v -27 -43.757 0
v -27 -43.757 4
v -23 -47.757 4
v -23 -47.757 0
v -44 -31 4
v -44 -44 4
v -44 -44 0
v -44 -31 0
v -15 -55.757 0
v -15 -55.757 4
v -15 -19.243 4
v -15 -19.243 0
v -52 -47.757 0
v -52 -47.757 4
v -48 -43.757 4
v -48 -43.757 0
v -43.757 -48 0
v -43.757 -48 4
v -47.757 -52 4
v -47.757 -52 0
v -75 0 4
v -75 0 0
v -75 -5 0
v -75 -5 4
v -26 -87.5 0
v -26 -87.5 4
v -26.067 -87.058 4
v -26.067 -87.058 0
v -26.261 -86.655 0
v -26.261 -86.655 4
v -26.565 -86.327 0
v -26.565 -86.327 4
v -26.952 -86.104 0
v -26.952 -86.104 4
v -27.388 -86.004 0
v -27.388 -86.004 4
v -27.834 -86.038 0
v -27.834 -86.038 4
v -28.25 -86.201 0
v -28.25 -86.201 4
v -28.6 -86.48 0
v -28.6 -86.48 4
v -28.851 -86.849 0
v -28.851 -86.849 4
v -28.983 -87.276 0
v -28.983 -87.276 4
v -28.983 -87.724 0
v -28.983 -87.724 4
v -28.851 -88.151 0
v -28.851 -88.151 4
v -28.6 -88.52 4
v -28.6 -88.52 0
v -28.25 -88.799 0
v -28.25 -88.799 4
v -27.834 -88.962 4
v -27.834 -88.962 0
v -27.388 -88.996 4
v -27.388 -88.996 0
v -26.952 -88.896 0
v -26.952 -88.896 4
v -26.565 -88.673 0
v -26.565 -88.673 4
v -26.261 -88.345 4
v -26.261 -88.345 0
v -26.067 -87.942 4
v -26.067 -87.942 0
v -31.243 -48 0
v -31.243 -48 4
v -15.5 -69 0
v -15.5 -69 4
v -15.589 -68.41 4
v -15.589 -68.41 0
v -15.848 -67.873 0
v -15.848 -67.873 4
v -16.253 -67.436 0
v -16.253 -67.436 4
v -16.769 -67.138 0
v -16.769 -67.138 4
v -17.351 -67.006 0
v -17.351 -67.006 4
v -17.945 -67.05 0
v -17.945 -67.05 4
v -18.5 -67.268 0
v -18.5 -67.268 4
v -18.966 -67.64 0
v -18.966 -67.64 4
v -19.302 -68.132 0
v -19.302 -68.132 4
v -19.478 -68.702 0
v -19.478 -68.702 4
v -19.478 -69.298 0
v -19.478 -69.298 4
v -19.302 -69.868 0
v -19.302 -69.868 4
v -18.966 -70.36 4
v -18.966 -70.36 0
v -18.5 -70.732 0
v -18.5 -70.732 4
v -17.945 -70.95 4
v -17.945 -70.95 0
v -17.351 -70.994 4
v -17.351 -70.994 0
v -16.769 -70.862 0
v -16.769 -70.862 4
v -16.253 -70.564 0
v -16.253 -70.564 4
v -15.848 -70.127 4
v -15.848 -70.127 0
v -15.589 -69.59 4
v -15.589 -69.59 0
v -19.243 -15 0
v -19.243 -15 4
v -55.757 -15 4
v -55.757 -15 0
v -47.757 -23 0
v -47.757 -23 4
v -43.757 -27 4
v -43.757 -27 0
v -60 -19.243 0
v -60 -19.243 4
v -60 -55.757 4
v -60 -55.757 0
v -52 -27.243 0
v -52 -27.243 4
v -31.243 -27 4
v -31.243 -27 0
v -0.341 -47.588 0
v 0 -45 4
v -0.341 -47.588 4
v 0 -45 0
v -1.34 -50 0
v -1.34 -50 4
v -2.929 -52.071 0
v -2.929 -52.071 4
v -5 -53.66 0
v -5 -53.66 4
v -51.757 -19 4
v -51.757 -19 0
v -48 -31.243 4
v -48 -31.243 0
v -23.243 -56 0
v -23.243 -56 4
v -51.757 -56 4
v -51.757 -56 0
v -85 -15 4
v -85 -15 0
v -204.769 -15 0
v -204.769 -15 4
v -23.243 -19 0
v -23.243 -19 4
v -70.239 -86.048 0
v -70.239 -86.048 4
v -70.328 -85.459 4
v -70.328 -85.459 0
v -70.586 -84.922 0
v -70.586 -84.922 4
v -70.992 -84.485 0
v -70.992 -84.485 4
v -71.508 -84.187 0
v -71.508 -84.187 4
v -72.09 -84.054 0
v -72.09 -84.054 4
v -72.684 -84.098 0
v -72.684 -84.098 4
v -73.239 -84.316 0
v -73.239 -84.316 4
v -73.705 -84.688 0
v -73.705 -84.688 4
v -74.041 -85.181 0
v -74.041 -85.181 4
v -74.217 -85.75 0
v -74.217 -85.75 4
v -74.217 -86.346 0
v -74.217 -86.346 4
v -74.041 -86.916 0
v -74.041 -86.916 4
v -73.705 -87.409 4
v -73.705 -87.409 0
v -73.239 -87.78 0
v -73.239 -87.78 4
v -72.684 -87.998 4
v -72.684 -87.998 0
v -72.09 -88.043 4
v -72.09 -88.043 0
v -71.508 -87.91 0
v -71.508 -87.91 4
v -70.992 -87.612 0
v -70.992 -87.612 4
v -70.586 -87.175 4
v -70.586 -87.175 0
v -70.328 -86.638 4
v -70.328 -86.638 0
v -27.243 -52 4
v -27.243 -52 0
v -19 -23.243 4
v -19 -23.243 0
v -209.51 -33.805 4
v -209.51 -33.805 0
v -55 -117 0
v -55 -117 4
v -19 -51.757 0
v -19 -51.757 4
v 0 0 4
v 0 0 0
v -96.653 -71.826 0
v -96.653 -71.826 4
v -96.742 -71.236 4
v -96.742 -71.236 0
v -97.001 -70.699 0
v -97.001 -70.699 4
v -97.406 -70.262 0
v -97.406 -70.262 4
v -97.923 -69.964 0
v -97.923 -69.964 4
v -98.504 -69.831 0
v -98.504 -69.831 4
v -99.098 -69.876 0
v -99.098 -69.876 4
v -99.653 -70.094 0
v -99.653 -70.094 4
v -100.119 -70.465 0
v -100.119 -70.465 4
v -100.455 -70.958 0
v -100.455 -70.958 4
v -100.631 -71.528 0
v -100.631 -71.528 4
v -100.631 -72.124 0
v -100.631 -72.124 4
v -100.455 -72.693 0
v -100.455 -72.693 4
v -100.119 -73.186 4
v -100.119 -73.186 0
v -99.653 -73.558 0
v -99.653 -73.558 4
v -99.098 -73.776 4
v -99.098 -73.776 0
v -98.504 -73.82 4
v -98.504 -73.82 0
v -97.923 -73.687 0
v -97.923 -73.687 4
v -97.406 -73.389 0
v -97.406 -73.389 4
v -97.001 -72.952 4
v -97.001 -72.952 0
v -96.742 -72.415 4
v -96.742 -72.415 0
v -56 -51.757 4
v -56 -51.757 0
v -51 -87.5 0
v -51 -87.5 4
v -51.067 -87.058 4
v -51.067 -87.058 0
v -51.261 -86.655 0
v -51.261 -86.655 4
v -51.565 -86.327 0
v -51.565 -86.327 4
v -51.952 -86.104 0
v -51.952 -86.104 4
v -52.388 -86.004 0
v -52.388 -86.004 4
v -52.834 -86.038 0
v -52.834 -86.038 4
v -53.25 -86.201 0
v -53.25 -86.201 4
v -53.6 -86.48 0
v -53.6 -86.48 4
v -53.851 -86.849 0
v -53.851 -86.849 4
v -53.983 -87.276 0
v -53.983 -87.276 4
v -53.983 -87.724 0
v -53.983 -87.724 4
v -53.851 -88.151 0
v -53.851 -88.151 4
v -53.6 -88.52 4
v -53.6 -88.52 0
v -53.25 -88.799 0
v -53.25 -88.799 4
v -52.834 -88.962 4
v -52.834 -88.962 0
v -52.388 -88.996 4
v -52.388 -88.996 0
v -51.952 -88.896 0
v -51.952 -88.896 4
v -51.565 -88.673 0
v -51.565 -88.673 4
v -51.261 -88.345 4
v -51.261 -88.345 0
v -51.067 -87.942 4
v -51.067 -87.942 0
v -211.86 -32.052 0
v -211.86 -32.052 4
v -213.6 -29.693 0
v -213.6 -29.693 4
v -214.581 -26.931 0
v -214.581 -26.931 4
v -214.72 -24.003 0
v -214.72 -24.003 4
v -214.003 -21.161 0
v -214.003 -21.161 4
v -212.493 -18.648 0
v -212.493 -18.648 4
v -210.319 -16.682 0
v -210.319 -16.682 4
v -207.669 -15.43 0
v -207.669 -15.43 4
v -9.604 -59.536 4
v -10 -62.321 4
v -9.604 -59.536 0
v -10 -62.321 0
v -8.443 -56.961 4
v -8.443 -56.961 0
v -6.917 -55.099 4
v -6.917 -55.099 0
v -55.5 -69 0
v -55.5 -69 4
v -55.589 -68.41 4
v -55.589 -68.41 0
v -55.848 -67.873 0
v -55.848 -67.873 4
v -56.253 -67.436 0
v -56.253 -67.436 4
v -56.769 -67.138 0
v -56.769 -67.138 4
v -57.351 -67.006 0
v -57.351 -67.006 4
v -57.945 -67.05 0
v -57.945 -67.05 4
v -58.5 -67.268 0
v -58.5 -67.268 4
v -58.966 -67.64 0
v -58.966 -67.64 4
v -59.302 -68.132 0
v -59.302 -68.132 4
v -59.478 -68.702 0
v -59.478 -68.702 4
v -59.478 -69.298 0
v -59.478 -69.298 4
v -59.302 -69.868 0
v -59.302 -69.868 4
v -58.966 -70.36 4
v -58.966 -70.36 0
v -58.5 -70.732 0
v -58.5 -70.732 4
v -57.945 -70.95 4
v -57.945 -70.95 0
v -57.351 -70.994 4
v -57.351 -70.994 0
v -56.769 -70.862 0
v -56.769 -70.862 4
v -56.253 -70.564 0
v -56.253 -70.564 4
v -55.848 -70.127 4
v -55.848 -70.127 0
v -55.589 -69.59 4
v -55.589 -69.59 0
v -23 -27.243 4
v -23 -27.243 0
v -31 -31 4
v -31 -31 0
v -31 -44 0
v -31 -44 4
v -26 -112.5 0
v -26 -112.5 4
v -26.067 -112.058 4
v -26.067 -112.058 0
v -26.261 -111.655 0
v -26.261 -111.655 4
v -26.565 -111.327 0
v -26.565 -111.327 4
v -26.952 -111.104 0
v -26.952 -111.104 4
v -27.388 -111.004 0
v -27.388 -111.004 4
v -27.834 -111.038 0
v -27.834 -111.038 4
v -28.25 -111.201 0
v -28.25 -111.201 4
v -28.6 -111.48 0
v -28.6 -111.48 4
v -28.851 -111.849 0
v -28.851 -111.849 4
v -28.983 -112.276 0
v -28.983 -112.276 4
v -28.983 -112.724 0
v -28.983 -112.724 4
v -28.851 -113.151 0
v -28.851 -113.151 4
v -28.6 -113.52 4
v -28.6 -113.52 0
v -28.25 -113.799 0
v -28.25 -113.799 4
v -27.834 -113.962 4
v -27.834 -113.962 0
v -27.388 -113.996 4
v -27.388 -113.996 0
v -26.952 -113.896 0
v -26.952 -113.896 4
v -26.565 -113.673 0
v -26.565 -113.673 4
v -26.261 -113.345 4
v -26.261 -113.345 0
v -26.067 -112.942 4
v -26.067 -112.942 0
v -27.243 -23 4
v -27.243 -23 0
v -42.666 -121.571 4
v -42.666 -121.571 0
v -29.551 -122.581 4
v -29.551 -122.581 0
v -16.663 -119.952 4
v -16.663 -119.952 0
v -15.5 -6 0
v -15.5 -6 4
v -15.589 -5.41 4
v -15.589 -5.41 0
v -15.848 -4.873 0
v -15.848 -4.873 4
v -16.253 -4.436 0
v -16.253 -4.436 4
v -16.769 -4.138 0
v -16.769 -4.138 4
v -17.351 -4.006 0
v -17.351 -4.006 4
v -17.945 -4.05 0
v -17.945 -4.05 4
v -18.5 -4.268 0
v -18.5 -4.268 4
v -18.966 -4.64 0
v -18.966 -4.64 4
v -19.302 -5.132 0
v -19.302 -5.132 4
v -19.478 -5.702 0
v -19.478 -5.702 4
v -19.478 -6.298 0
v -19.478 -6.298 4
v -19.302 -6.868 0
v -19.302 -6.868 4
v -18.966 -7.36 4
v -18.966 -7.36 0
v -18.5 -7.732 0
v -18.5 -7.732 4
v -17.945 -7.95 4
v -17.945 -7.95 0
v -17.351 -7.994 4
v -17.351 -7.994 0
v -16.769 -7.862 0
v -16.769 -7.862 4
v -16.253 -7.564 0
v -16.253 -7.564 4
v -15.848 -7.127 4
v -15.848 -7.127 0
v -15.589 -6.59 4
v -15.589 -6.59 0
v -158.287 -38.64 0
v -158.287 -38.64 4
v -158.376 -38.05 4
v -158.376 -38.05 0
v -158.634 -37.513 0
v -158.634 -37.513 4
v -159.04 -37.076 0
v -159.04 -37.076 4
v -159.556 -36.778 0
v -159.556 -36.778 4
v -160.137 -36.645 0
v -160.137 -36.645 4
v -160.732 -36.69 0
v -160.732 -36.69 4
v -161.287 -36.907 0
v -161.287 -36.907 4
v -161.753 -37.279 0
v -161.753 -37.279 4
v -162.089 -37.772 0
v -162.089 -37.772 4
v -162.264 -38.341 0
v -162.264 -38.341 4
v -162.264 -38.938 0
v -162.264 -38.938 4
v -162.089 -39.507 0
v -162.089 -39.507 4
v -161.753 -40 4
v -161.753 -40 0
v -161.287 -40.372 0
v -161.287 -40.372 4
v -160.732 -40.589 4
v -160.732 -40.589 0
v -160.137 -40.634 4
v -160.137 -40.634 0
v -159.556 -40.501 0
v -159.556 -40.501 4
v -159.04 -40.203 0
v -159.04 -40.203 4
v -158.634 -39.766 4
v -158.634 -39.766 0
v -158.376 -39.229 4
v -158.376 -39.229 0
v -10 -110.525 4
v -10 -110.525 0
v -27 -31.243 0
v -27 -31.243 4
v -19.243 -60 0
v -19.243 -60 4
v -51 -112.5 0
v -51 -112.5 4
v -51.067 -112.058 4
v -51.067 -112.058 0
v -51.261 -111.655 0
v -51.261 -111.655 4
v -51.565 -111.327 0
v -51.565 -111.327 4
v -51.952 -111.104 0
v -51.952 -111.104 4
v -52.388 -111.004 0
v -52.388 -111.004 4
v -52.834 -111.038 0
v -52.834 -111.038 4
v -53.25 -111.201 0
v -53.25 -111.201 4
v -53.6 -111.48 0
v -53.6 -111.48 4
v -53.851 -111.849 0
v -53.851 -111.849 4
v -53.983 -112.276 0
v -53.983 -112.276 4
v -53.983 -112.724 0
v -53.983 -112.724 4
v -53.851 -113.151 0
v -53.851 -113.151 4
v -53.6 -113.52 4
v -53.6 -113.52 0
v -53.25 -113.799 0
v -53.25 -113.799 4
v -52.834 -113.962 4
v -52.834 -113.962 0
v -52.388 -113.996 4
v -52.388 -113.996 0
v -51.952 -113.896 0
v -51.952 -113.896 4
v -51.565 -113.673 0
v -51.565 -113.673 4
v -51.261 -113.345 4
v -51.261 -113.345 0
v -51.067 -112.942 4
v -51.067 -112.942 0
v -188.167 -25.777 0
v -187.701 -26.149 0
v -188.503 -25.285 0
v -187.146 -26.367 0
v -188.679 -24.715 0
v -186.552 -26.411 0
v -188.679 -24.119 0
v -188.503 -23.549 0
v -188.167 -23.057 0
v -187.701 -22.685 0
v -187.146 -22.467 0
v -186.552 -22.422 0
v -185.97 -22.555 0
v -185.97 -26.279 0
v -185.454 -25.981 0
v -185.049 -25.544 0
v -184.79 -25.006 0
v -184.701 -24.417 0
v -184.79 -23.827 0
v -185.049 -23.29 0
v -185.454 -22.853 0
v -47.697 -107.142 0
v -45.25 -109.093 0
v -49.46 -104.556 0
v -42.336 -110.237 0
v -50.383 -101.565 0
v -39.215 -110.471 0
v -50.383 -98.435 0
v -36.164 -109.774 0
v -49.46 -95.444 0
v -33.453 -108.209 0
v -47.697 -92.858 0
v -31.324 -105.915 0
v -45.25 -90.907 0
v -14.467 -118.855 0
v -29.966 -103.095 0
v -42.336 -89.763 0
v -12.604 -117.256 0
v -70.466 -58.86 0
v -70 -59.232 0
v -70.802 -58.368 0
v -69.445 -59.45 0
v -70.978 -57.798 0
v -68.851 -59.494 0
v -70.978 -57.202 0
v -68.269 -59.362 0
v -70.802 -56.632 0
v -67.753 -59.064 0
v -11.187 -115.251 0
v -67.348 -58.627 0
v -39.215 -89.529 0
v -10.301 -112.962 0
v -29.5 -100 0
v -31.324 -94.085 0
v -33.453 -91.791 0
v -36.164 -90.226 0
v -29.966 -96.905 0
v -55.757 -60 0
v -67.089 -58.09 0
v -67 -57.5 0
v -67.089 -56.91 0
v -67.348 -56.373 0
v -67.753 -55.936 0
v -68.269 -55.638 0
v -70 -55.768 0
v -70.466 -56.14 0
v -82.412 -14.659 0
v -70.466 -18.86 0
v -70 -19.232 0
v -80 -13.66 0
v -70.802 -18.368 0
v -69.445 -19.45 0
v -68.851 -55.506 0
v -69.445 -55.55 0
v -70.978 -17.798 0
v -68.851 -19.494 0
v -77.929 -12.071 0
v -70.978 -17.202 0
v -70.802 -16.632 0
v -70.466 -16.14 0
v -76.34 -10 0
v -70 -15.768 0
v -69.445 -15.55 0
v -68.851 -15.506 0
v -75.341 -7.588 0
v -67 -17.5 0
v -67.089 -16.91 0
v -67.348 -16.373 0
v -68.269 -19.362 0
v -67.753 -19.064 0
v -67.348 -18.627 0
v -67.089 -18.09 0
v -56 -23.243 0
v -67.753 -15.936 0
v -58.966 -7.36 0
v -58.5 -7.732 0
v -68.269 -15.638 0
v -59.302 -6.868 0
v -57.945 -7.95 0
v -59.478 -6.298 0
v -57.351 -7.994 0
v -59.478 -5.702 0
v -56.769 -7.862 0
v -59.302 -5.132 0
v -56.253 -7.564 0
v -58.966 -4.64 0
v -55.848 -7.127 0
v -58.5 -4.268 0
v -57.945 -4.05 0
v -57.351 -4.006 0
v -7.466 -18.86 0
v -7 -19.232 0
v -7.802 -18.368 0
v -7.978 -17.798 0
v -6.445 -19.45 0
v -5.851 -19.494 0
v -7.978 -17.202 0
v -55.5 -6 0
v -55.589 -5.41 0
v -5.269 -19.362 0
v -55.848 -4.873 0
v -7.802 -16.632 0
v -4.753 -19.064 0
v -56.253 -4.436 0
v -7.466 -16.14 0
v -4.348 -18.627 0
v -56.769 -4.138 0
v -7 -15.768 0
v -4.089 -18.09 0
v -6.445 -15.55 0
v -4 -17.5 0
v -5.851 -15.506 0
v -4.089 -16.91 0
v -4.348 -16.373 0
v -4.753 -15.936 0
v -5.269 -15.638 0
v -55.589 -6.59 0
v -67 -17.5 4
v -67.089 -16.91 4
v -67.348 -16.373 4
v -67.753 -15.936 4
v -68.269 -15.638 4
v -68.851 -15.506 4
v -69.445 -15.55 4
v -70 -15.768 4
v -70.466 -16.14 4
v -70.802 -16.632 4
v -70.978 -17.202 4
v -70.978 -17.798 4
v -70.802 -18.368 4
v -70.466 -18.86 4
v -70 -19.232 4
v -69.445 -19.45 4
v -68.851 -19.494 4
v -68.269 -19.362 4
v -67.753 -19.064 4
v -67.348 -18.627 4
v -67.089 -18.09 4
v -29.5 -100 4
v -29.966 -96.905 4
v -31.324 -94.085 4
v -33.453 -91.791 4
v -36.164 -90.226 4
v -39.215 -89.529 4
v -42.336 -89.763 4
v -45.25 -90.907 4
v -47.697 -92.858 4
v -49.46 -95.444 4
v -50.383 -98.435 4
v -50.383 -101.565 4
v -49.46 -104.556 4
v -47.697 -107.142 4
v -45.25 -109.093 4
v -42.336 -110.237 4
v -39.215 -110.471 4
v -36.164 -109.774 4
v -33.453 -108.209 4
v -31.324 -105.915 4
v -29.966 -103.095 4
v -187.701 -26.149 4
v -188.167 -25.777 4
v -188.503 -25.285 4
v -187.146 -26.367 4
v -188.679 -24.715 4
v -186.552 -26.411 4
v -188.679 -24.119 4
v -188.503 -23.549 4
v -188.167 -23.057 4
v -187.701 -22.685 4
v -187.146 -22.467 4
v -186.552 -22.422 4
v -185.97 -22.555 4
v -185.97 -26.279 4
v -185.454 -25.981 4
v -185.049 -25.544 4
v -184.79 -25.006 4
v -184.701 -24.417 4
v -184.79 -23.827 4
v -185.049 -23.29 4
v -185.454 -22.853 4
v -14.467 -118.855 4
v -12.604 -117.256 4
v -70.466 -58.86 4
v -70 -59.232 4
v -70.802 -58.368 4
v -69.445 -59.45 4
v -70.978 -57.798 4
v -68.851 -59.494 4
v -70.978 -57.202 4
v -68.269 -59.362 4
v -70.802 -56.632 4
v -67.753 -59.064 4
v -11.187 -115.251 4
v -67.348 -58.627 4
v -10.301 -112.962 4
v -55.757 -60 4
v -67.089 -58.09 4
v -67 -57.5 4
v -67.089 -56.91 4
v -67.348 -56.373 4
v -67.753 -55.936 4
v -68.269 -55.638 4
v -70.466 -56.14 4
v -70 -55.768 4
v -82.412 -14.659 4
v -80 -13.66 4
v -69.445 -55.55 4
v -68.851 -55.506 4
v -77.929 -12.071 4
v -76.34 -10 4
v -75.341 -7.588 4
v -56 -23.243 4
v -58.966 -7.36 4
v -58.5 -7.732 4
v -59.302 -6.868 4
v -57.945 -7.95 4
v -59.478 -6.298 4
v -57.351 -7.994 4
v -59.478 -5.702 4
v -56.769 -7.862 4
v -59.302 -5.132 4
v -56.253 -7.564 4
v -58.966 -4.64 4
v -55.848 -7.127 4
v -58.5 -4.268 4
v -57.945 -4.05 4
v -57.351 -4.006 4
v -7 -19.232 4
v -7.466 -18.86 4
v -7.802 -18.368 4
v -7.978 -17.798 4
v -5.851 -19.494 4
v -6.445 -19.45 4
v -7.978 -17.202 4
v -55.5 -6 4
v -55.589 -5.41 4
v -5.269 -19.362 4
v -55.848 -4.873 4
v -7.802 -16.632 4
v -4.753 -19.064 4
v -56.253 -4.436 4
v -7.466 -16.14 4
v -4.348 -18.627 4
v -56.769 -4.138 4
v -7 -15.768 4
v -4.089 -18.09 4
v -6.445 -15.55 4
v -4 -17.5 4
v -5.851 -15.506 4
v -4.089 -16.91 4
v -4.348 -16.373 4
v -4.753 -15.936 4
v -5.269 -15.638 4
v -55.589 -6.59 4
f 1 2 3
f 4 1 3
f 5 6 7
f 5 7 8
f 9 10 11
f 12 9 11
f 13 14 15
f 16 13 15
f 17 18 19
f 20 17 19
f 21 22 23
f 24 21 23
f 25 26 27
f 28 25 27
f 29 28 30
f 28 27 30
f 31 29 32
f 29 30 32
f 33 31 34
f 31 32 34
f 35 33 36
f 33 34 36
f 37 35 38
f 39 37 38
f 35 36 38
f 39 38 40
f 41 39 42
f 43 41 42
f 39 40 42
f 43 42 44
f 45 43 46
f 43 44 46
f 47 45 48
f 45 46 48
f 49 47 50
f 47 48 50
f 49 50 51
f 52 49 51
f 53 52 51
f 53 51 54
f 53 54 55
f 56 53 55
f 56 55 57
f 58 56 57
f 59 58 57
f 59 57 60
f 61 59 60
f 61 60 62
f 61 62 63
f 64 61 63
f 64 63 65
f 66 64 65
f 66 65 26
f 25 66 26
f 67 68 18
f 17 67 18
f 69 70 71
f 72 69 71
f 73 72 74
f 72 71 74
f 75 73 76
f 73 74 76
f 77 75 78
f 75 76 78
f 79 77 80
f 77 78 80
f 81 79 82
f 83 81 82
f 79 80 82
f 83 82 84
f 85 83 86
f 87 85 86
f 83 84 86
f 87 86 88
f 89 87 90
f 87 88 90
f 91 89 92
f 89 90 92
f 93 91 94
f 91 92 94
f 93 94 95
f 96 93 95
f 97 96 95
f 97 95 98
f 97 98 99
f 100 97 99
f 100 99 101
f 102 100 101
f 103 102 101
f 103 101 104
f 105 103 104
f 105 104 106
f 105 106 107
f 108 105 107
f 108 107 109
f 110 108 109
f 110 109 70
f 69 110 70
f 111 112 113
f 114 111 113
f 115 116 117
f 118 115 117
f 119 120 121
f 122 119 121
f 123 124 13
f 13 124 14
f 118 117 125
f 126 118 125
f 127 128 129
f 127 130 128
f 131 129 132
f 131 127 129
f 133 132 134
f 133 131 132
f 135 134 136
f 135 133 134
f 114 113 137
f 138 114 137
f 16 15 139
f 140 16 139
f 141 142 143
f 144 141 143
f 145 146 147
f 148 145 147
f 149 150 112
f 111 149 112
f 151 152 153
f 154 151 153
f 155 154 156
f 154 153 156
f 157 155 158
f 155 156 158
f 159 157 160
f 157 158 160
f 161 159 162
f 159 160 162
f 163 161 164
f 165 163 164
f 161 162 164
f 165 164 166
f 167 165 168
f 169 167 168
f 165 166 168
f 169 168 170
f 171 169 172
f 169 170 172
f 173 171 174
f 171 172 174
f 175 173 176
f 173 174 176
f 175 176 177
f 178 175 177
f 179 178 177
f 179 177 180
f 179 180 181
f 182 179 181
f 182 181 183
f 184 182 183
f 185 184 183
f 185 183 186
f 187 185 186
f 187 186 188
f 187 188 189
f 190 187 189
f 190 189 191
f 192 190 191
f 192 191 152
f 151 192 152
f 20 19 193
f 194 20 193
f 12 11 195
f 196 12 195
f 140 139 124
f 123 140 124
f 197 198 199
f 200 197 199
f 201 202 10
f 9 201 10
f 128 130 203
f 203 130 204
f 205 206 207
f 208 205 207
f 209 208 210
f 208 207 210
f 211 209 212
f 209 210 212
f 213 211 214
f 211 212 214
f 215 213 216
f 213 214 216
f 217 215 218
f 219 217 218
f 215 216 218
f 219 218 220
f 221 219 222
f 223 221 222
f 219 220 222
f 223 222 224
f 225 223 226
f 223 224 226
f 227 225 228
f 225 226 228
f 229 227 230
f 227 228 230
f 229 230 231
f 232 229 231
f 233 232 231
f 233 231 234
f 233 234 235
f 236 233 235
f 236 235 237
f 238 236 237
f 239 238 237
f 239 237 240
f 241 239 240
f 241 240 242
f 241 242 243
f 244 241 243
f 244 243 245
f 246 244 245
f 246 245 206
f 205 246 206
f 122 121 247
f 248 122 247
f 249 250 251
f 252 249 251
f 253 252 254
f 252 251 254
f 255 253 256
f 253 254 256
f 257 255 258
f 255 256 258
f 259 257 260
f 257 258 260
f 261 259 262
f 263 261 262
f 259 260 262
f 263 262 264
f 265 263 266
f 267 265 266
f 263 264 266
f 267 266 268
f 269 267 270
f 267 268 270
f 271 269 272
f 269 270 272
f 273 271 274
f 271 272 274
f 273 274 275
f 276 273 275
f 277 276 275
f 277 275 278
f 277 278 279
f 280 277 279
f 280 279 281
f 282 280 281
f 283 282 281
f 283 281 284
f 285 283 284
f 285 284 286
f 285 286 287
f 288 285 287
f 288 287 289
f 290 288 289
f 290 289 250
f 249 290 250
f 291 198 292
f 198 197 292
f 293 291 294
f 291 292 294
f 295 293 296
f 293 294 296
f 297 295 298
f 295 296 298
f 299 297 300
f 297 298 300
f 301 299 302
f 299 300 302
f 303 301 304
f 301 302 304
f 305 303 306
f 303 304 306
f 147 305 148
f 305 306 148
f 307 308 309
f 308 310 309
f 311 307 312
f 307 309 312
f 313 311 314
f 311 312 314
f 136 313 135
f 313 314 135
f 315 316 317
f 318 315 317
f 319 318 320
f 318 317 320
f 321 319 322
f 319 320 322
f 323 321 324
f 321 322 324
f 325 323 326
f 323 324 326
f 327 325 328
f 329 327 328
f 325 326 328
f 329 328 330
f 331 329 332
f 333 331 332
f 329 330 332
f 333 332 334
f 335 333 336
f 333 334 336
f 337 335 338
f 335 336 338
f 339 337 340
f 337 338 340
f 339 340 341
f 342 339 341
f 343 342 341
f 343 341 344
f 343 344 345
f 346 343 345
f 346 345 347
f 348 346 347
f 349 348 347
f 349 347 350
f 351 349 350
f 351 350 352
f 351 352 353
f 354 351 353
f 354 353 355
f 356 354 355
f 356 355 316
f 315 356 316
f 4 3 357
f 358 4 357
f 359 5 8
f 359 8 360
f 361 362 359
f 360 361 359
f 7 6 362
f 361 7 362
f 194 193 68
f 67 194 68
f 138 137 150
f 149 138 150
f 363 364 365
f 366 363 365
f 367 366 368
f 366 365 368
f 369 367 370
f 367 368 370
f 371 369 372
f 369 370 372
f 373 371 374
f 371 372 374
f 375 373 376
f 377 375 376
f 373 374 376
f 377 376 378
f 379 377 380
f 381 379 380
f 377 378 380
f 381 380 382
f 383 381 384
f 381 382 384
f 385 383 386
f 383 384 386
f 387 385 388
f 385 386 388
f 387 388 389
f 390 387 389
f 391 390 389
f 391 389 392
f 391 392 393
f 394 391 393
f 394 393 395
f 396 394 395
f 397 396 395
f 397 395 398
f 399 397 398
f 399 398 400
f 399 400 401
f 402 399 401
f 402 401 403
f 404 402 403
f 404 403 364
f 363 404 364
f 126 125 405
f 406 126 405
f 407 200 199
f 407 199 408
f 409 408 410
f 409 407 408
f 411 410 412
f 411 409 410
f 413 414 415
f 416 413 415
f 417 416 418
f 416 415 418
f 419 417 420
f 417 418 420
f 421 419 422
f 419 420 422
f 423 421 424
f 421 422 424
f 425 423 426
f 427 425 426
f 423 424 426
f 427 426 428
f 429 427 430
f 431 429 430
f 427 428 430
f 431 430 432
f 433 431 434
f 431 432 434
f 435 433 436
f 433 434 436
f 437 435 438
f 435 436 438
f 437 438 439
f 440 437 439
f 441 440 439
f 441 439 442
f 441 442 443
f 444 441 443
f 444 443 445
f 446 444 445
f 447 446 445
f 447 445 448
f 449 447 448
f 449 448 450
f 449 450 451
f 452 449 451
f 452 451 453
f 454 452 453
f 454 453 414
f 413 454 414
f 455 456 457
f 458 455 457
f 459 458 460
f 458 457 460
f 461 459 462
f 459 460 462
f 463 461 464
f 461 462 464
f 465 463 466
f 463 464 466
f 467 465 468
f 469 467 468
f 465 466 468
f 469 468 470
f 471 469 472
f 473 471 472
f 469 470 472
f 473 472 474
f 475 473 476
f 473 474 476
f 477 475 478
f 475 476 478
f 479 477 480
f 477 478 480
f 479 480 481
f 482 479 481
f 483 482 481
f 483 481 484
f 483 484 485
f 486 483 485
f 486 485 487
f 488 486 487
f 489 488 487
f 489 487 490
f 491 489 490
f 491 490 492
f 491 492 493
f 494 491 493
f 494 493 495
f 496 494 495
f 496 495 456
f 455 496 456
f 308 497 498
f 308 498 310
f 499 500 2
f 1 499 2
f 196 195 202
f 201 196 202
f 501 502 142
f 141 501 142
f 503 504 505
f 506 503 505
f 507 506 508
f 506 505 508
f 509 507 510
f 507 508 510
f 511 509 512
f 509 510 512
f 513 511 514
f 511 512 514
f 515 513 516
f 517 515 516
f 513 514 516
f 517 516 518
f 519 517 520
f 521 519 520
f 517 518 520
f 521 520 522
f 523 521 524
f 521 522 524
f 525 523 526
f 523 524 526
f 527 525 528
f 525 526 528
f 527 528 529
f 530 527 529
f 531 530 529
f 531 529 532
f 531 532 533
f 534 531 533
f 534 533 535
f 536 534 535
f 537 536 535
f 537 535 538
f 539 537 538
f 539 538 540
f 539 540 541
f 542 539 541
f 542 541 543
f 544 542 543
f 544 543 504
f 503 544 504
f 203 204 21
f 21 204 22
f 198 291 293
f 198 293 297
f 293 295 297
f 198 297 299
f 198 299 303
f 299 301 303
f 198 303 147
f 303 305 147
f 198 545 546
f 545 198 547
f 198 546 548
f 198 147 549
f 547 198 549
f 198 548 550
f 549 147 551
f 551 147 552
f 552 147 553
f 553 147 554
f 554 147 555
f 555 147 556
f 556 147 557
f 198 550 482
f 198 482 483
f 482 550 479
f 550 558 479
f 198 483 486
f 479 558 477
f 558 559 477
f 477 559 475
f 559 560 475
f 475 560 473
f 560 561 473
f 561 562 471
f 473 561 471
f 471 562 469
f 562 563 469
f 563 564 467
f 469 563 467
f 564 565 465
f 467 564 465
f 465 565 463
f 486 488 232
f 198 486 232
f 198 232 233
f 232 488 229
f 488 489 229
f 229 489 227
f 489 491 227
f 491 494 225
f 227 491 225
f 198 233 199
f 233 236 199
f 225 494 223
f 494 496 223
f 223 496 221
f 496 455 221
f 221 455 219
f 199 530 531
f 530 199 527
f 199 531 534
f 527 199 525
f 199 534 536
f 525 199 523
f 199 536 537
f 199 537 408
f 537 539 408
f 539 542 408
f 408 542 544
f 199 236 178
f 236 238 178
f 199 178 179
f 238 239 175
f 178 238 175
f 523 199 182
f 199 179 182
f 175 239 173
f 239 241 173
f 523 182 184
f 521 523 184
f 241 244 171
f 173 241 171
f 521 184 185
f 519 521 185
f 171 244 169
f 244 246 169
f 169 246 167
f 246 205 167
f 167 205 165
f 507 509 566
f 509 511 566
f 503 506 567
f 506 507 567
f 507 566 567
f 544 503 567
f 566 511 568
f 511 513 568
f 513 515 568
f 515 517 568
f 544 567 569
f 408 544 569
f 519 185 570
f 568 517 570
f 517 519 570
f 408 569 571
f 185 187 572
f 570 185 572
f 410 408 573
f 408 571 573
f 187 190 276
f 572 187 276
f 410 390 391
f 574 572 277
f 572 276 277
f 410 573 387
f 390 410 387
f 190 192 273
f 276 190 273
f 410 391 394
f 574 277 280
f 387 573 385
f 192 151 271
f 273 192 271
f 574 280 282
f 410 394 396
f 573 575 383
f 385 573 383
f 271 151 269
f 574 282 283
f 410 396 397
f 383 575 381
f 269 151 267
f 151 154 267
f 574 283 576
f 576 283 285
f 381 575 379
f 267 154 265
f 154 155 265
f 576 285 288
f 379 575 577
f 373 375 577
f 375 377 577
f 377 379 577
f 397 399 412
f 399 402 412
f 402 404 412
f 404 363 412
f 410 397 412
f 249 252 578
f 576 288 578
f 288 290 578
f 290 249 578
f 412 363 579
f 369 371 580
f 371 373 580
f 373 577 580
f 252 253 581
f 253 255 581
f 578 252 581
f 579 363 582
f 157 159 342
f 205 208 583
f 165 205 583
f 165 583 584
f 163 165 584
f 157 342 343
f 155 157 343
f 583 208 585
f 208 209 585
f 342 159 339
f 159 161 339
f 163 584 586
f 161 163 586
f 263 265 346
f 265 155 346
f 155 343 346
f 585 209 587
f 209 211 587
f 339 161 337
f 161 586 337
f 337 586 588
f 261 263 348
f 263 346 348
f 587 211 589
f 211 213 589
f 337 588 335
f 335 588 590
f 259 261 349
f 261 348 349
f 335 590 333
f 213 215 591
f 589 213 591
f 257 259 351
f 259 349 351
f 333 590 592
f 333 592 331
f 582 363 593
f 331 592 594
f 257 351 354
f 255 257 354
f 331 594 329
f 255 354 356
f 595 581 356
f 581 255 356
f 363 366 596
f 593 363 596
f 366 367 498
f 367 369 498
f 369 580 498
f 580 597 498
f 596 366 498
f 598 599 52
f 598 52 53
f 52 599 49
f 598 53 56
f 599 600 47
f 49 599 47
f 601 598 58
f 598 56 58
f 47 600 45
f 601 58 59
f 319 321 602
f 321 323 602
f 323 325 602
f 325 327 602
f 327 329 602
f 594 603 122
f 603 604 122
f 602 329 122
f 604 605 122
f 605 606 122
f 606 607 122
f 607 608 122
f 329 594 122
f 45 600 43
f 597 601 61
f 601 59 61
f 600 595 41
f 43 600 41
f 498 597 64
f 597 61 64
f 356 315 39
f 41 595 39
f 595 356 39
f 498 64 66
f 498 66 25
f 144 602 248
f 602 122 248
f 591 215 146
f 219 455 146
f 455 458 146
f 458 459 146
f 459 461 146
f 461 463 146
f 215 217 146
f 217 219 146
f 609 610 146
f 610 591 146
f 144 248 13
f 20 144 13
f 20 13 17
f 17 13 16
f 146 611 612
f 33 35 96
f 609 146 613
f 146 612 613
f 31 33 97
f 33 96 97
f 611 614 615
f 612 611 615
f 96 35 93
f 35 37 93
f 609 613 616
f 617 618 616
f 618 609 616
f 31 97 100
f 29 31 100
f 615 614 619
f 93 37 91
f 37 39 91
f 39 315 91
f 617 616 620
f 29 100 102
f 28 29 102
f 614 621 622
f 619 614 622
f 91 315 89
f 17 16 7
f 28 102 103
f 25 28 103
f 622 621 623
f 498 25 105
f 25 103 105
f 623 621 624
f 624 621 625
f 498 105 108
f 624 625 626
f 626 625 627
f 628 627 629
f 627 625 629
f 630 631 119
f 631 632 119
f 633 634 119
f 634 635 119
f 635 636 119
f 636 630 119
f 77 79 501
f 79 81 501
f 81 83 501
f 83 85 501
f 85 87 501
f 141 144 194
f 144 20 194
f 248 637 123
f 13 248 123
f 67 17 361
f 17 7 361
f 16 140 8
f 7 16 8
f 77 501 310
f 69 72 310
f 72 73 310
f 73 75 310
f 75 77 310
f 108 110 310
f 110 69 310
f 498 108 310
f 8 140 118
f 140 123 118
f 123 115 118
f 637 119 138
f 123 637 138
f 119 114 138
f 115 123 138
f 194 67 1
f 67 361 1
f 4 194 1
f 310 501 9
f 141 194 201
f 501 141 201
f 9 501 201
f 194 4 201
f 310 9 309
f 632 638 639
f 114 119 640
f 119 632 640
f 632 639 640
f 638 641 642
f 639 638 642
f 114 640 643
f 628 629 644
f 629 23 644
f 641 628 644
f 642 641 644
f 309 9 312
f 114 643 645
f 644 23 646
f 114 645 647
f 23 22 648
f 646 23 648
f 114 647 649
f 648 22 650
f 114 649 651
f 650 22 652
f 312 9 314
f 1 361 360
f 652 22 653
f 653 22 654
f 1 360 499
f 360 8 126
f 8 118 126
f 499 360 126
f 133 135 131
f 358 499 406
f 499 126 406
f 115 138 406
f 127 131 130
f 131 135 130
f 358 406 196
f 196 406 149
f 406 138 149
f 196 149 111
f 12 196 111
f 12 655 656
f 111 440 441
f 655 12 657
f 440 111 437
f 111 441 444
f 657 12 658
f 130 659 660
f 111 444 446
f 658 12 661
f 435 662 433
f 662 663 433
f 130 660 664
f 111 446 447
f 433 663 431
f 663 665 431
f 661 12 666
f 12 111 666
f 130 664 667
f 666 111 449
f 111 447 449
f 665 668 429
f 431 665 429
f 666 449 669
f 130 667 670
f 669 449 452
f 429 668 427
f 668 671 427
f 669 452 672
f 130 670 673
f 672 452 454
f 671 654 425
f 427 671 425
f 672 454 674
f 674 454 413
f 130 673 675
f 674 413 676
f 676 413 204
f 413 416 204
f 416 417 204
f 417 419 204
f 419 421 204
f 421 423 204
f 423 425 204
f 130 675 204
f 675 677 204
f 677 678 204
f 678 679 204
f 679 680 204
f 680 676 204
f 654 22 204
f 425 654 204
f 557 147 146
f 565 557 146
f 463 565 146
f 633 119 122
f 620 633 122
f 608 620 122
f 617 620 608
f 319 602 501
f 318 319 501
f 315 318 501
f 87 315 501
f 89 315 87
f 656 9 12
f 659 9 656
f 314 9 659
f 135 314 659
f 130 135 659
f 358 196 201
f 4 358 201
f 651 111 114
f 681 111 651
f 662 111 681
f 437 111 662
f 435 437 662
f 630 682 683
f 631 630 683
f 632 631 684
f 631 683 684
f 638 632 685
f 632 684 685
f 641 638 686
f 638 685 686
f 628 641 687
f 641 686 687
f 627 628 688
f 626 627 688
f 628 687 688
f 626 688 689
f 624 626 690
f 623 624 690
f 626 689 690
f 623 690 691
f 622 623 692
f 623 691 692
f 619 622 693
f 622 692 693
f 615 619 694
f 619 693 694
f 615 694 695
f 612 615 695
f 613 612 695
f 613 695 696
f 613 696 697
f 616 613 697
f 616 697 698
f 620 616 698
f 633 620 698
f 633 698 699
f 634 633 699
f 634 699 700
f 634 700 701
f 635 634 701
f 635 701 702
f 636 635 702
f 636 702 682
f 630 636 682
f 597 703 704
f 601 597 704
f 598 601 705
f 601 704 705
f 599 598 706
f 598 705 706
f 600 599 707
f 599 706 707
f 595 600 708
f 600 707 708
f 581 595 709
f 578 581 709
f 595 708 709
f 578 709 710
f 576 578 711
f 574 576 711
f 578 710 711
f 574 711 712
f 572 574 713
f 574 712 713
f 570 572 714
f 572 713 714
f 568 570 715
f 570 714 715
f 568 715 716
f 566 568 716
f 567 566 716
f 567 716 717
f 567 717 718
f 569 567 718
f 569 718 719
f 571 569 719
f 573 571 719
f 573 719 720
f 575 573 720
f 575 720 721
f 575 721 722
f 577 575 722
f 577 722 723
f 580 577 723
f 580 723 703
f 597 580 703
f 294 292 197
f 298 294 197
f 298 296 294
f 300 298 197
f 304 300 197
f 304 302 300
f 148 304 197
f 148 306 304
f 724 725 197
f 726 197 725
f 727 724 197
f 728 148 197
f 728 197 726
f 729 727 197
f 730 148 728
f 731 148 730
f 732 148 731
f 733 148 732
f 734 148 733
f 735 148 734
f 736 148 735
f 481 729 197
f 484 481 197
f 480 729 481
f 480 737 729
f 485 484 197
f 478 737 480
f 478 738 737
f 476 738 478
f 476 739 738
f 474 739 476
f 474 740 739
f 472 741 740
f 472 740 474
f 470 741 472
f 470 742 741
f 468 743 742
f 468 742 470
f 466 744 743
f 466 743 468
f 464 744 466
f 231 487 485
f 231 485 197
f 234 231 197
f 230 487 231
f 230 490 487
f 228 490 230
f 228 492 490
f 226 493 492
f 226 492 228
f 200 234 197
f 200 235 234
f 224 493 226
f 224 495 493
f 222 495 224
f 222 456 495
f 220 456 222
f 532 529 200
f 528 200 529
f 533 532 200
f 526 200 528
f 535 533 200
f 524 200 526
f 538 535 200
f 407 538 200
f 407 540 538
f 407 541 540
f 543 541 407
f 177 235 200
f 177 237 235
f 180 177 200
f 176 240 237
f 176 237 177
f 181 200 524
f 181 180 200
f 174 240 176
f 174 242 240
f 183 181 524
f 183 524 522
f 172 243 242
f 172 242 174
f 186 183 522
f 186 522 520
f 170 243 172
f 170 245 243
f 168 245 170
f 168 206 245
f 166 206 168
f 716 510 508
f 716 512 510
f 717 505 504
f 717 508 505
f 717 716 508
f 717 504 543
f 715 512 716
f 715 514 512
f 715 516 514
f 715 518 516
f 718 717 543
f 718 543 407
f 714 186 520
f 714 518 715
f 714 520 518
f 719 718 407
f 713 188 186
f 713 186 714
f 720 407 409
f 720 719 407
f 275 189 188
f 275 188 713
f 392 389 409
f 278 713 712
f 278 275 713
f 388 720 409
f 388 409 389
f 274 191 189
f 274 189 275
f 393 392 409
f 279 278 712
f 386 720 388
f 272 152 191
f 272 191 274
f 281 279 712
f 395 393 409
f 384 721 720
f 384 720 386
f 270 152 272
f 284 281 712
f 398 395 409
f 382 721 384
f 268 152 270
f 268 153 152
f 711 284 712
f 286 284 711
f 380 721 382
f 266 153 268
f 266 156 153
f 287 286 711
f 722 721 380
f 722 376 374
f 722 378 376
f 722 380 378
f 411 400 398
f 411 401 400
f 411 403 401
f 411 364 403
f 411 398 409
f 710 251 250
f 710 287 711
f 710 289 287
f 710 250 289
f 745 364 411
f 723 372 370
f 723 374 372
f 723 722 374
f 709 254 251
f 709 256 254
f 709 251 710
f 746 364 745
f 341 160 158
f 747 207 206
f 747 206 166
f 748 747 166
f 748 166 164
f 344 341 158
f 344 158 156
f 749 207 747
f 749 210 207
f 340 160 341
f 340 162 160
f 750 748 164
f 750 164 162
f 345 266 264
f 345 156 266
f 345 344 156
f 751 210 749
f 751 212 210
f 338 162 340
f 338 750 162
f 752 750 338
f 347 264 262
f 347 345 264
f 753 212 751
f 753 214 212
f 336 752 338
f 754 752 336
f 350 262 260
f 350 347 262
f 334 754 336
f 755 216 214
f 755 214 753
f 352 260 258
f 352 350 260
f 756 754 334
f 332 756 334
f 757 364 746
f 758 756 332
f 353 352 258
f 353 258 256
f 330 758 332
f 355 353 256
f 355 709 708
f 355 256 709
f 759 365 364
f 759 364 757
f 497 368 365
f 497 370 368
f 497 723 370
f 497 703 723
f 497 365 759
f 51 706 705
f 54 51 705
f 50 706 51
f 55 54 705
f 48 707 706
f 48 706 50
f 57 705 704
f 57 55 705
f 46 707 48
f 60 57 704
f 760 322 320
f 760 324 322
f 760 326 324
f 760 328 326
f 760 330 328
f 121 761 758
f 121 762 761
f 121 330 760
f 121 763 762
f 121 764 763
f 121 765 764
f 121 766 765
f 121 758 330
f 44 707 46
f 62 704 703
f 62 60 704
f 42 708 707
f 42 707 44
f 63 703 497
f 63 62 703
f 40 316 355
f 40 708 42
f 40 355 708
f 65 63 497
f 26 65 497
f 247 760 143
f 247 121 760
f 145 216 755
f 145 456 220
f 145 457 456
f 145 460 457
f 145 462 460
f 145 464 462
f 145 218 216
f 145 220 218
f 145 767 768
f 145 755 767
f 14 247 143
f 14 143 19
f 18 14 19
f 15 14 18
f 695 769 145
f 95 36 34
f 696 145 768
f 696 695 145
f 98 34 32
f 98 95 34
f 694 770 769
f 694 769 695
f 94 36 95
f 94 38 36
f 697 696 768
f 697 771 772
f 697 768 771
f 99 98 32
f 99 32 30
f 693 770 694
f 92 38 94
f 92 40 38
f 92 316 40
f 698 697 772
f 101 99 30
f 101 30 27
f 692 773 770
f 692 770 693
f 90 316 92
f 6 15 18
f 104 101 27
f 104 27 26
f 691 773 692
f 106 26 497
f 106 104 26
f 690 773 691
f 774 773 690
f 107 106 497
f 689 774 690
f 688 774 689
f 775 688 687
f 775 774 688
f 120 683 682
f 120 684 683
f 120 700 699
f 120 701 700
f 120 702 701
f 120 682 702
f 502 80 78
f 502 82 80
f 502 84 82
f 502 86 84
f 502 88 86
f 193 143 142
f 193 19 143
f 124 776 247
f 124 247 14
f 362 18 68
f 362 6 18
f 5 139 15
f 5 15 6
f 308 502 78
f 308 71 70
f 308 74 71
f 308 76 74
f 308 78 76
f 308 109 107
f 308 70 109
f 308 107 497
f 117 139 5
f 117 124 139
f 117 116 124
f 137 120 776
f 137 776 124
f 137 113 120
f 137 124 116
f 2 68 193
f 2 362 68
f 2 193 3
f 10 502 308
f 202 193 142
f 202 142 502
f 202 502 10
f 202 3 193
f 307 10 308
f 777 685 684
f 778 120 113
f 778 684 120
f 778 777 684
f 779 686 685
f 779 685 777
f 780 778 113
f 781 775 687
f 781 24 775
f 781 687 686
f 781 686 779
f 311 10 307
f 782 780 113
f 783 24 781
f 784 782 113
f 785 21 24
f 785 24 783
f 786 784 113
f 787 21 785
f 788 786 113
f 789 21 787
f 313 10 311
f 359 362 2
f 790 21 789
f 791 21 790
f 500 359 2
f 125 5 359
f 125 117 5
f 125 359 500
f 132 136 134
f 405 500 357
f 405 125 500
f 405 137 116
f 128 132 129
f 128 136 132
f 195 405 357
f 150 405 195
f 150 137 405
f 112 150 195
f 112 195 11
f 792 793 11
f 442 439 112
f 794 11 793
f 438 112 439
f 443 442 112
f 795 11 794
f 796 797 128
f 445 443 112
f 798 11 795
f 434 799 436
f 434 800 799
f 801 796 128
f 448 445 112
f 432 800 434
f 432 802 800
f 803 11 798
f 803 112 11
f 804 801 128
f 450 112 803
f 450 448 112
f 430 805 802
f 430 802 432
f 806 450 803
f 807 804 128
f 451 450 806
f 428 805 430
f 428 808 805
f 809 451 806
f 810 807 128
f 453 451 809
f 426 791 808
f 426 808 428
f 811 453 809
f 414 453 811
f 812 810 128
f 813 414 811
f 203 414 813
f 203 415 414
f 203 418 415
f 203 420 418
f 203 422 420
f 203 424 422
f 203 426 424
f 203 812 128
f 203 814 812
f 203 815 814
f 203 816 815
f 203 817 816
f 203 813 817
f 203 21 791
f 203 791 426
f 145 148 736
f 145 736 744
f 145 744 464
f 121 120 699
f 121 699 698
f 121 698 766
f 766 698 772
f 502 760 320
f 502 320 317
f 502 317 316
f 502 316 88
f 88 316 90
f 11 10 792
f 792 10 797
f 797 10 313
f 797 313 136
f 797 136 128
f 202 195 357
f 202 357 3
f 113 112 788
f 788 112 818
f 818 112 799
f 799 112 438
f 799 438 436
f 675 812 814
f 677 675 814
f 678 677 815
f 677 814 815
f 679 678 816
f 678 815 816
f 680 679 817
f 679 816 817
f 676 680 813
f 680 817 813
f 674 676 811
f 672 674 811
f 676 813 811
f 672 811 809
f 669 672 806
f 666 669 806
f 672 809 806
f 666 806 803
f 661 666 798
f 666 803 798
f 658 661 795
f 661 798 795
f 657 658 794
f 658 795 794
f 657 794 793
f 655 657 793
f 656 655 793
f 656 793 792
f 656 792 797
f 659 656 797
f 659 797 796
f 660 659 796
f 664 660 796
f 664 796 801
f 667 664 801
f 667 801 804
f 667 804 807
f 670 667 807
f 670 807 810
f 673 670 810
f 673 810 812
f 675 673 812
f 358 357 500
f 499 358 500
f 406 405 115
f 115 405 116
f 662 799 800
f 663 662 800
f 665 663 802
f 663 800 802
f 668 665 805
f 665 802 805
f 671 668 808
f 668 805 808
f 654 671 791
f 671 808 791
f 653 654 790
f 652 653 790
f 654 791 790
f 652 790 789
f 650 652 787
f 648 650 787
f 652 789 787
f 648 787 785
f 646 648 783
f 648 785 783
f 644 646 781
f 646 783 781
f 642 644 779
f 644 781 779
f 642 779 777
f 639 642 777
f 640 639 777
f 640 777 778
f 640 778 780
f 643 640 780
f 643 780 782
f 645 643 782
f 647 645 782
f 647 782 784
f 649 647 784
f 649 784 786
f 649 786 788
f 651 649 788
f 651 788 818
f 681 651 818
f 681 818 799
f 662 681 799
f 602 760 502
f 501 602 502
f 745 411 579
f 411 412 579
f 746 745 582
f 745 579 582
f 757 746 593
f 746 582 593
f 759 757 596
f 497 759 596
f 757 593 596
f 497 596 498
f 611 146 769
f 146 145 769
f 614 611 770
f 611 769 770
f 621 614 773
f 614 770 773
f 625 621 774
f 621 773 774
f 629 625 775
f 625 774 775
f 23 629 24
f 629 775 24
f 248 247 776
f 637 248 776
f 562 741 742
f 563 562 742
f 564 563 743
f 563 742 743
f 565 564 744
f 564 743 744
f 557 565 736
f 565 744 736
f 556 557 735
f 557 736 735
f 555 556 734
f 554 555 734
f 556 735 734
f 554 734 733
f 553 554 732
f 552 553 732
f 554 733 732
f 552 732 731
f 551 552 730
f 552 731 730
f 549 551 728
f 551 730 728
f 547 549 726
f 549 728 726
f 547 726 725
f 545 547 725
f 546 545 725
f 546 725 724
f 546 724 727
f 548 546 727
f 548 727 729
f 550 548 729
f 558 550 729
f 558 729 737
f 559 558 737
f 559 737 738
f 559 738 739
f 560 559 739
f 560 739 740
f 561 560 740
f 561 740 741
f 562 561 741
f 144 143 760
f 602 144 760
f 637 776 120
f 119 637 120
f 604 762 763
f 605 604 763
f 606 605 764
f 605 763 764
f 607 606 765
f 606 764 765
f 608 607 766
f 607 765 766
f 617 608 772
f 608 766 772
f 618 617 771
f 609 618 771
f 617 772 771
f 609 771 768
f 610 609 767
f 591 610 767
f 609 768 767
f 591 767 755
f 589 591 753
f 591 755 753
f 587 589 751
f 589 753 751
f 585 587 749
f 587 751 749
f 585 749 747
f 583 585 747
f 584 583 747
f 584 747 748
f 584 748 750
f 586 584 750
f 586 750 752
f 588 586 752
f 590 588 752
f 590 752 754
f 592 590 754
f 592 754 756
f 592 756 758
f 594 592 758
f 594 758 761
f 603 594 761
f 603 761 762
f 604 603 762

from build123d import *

# Parameters (mm, degrees)
EXTRUDE_1_DEPTH     = 4
SKETCH_3_R          = 2
CUT_EXTRUDE_1_DEPTH = 272.02260581
SKETCH_4_R          = 10.5
SKETCH_4_R_2        = 1.5
CUT_EXTRUDE_2_DEPTH = 272.02260581
SKETCH_5_R          = 2
CUT_EXTRUDE_3_DEPTH = 272.02260581
SKETCH_6_W          = 10
SKETCH_6_H          = 62
CUT_EXTRUDE_4_DEPTH = 272.02260581
FILLET_1_R          = 10
SKETCH_7_W          = 13
SKETCH_7_H          = 13
CUT_EXTRUDE_5_DEPTH = 4
EXTRUDE_2_DEPTH     = 4
FILLET_2_R          = 10


with BuildPart() as part:
    # 草图2 → 凸台-拉伸1 (new body)
    with BuildSketch(Plane.XY):
        Polygon((0, 0), (-75, 0), (-75, -15), (-244.434557418, -15), (-55, -117), (0, -117), align=None)
    extrude(amount=EXTRUDE_1_DEPTH)

    # 草图3 → 切除-拉伸1 (cut, through all)
    with BuildSketch(Plane.XY.offset(4)):
        with Locations((-57.5, -6)):
            Circle(SKETCH_3_R)
        with Locations((-69, -17.5)):
            Circle(SKETCH_3_R)
        with Locations((-17.5, -6)):
            Circle(SKETCH_3_R)
        with Locations((-6, -17.5)):
            Circle(SKETCH_3_R)
        with Locations((-6, -57.5)):
            Circle(SKETCH_3_R)
        with Locations((-17.5, -69)):
            Circle(SKETCH_3_R)
        with Locations((-57.5, -69)):
            Circle(SKETCH_3_R)
        with Locations((-69, -57.5)):
            Circle(SKETCH_3_R)
    extrude(amount=-CUT_EXTRUDE_1_DEPTH, mode=Mode.SUBTRACT)

    # 草图4 → 切除-拉伸2 (cut, through all)
    with BuildSketch(Plane.XY.offset(4)):
        with Locations((-40, -100)):
            Circle(SKETCH_4_R)
        with Locations((-52.5, -112.5)):
            Circle(SKETCH_4_R_2)
        with Locations((-27.5, -112.5)):
            Circle(SKETCH_4_R_2)
        with Locations((-27.5, -87.5)):
            Circle(SKETCH_4_R_2)
        with Locations((-52.5, -87.5)):
            Circle(SKETCH_4_R_2)
    extrude(amount=-CUT_EXTRUDE_2_DEPTH, mode=Mode.SUBTRACT)

    # 草图5 → 切除-拉伸3 (cut, through all)
    with BuildSketch(Plane.XY.offset(4)):
        with Locations((-98.653292605, -71.825698472)):
            Circle(SKETCH_5_R)
        with Locations((-72.238972, -86.048344744)):
            Circle(SKETCH_5_R)
        with Locations((-160.286707351, -38.639523839)):
            Circle(SKETCH_5_R)
        with Locations((-186.701027956, -24.416877568)):
            Circle(SKETCH_5_R)
    extrude(amount=-CUT_EXTRUDE_3_DEPTH, mode=Mode.SUBTRACT)

    # 草图6 → 切除-拉伸4 (cut, through all)
    with BuildSketch(Plane.XY.offset(4)):
        with Locations((-5, -86)):
            Rectangle(SKETCH_6_W, SKETCH_6_H)
    extrude(amount=-CUT_EXTRUDE_4_DEPTH, mode=Mode.SUBTRACT)

    # 圆角1
    fillet_1_edges = [part.edges().sort_by_distance(p)[0] for p in [
        (0, -55, 2),
    ]]
    fillet(fillet_1_edges, radius=FILLET_1_R - 0.0001)  # a hair under: the kernel refuses the full size

    # 草图7 → 切除-拉伸5 (cut)
    with BuildSketch(Plane.XY.offset(4)):
        Polygon((-19.242640687, -15), (-55.757359313, -15), (-51.757359313, -19), (-23.242640687, -19), align=None)
        Polygon((-56, -23.242640687), (-60, -19.242640687), (-60, -55.757359313), (-56, -51.757359313), align=None)
        Polygon((-51.757359313, -56), (-55.757359313, -60), (-19.242640687, -60), (-23.242640687, -56), align=None)
        Polygon((-15, -55.757359313), (-15, -19.242640687), (-19, -23.242640687), (-19, -51.757359313), align=None)
        Polygon((-27.242640687, -23), (-47.757359313, -23), (-43.757359313, -27), (-31.242640687, -27), align=None)
        Polygon((-48, -31.242640687), (-52, -27.242640687), (-52, -47.757359313), (-48, -43.757359313), align=None)
        Polygon((-43.757359313, -48), (-47.757359313, -52), (-27.242640687, -52), (-31.242640687, -48), align=None)
        Polygon((-23, -47.757359313), (-23, -27.242640687), (-27, -31.242640687), (-27, -43.757359313), align=None)
        with Locations((-37.5, -37.5)):
            Rectangle(SKETCH_7_W, SKETCH_7_H)
    extrude(amount=-CUT_EXTRUDE_5_DEPTH, mode=Mode.SUBTRACT)

    # 草图8 → 凸台-拉伸2 (add)
    with BuildSketch(Plane.XY.offset(4)):
        with BuildLine():
            Line((-10, -117), (-55, -117))
            ThreePointArc((-55, -117), (-32.5, -122.672487724), (-10, -117))
        make_face()
    extrude(amount=-EXTRUDE_2_DEPTH)

    # 圆角2
    fillet_2_edges = [part.edges().sort_by_distance(p)[0] for p in [
        (-10, -117, 2),
        (-10, -55, 2),
        (-244.434557418, -15, 2),
        (-75, -15, 2),
    ]]
    fillet(fillet_2_edges, radius=FILLET_2_R)


solid = part.part
